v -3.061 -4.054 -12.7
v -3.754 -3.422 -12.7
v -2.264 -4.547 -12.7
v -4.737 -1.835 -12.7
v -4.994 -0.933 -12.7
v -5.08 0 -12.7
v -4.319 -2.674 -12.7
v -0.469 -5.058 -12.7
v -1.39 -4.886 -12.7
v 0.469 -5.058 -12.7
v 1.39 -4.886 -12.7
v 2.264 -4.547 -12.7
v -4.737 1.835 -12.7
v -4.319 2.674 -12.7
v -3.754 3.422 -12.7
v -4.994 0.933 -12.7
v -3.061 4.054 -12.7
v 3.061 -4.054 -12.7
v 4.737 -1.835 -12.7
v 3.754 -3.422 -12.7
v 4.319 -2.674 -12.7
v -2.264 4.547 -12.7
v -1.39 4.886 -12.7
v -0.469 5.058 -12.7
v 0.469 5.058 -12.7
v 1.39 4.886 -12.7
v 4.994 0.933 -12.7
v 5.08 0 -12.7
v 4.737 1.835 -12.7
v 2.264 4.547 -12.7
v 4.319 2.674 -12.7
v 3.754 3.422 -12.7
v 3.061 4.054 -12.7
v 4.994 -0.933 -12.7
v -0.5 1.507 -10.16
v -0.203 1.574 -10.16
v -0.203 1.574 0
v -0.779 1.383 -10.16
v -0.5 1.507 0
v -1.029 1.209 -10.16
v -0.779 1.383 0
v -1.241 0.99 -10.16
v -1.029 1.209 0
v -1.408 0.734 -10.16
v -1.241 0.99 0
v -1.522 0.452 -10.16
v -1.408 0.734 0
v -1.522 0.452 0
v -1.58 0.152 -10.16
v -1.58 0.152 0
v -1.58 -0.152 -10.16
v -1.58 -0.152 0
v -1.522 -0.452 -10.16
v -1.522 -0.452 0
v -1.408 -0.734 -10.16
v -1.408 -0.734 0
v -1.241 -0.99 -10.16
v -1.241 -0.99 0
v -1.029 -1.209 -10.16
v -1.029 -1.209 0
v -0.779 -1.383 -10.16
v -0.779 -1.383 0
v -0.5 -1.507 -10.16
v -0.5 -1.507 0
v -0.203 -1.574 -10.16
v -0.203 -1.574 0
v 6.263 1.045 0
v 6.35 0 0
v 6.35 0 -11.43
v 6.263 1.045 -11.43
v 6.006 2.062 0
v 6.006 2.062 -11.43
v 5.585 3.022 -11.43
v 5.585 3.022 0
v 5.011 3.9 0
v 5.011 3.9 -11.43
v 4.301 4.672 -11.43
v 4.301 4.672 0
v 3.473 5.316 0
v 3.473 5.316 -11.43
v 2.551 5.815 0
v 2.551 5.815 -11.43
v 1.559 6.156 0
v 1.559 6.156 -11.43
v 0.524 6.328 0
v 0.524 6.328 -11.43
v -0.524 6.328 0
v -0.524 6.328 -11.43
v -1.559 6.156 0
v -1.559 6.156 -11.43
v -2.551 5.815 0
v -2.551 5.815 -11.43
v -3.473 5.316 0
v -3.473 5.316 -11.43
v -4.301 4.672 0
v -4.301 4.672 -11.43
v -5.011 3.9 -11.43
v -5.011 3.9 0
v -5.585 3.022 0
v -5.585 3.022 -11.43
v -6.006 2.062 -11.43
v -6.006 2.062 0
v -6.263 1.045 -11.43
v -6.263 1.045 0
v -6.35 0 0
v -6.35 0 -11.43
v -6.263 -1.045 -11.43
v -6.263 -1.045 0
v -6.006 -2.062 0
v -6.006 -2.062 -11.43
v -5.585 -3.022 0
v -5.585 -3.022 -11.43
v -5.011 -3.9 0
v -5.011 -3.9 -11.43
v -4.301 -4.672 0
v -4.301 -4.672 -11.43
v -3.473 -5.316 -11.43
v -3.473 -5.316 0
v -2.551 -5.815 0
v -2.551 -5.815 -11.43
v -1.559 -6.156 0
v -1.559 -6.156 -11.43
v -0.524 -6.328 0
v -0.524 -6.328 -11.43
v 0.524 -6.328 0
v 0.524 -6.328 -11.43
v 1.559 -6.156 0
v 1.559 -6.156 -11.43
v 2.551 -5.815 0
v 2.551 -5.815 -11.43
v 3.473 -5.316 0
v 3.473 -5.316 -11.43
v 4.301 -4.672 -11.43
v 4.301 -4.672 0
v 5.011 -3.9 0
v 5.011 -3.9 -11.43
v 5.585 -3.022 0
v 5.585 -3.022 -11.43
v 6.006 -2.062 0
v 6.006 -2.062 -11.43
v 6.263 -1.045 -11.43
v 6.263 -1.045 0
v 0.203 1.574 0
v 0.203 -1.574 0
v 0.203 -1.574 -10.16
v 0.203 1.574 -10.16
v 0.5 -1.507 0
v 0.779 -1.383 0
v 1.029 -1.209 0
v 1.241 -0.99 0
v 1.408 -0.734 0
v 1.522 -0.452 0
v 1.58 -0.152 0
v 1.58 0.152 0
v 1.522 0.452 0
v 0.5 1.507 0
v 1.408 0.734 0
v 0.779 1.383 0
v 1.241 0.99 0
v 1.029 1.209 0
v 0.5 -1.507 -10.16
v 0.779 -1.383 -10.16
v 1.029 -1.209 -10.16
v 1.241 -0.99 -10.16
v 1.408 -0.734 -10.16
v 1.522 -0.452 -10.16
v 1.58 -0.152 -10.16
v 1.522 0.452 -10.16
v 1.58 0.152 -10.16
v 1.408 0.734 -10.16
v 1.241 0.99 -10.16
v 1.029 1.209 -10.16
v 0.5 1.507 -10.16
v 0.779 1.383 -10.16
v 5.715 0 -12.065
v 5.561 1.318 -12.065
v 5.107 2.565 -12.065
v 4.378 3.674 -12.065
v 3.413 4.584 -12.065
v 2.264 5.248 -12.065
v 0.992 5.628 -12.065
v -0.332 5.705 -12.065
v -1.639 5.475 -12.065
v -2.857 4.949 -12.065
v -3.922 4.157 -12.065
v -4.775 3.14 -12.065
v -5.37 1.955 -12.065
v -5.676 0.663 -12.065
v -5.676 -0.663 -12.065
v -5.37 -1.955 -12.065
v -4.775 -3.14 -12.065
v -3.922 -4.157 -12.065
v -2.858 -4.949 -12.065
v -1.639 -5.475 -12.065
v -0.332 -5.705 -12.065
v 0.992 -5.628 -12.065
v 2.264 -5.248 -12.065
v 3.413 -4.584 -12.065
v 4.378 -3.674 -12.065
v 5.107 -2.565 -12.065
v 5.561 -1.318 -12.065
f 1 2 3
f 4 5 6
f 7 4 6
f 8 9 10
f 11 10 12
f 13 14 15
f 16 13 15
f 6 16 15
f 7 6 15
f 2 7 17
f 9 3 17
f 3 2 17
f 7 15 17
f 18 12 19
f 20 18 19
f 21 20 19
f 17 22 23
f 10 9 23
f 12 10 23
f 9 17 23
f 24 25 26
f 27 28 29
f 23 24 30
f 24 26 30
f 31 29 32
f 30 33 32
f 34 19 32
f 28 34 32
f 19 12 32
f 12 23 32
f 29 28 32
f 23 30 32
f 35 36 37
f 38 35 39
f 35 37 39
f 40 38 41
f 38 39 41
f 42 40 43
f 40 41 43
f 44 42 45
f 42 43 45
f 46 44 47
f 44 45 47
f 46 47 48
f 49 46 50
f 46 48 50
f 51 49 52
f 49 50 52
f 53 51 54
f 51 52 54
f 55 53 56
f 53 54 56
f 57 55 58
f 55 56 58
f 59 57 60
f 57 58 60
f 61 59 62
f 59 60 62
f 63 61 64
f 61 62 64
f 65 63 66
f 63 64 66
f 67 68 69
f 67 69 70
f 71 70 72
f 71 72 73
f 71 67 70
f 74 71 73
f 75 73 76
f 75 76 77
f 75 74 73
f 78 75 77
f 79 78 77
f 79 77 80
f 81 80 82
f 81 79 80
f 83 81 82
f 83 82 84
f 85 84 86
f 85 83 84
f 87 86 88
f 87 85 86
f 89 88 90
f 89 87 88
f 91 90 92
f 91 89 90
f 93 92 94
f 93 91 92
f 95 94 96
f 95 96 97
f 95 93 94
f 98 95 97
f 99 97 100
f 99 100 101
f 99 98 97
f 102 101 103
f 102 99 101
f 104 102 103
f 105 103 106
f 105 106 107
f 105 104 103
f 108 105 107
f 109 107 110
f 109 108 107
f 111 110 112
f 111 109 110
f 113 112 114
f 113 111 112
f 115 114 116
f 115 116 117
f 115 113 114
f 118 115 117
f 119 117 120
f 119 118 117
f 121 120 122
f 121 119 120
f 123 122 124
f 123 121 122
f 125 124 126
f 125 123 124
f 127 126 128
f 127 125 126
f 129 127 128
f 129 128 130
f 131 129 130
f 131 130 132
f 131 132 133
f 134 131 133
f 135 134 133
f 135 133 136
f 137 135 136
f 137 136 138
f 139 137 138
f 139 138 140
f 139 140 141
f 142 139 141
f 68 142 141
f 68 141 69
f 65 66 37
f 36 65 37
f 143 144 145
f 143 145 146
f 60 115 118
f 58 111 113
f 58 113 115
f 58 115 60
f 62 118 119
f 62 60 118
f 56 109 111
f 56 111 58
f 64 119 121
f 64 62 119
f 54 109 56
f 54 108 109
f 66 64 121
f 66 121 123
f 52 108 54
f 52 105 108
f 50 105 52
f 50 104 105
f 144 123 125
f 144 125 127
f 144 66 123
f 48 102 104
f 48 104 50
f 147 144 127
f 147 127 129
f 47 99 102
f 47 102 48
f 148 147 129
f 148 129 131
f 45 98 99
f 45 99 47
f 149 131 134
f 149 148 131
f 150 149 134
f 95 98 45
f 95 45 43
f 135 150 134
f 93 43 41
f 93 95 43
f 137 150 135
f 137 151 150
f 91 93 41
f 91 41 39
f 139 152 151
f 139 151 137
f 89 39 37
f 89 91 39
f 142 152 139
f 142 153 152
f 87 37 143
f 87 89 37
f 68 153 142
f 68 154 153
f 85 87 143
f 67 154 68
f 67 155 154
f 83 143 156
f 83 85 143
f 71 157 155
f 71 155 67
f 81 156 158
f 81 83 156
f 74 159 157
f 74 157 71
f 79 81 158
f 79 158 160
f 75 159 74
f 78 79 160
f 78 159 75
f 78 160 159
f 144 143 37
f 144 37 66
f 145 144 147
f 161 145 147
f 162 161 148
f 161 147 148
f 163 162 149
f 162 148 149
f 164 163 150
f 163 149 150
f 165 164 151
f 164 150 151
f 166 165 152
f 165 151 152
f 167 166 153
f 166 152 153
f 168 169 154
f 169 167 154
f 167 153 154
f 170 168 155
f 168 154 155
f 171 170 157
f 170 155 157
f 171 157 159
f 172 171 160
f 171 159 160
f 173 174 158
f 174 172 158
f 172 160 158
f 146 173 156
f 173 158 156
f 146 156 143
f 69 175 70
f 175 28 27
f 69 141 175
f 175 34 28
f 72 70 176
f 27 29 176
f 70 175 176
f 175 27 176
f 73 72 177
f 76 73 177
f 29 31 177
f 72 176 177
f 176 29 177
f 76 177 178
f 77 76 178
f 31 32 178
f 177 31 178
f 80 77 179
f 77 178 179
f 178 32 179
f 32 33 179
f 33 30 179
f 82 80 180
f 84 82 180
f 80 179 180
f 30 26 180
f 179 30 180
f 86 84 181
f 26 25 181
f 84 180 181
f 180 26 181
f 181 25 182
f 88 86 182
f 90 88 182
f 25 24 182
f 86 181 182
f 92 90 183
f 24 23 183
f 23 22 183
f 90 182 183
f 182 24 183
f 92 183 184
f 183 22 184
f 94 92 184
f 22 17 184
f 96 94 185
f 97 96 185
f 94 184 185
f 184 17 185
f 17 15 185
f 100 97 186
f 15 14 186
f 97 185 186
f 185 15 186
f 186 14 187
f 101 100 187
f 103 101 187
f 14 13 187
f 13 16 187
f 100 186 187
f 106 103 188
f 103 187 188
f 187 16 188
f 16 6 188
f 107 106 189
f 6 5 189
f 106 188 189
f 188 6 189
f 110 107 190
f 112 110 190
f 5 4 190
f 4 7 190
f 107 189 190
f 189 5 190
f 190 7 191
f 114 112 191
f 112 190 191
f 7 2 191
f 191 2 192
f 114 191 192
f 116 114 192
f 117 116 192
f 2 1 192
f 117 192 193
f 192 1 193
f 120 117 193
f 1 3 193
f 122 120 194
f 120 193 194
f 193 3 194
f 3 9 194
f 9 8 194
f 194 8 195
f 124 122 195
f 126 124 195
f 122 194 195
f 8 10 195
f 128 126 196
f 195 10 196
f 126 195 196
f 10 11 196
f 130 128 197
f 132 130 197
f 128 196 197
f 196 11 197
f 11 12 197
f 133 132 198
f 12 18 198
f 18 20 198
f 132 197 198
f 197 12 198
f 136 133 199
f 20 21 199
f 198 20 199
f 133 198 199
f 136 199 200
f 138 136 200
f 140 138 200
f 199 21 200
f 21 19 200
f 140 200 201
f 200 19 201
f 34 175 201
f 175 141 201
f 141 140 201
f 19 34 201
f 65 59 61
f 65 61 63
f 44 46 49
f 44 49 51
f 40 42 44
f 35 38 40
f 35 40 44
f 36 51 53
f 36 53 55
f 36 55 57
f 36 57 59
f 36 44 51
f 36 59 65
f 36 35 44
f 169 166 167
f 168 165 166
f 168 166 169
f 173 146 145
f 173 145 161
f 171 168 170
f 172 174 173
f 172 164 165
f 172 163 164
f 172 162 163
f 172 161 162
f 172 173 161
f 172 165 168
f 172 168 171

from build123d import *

# Parameters (mm, degrees)
F0_R     = 6.35
F1_DEPTH = 12.7
F2_R     = 1.5875
F3_DEPTH = 10.16
F4_W     = 0.4064
F4_H     = 3.728392
F5_DEPTH = 11.4554
F6_SIZE  = 1.27


with BuildPart() as f1:
    # F0 (on Top) → F1 (new body)
    with BuildSketch(Plane.XY):
        Circle(F0_R)
    extrude(amount=-F1_DEPTH)

    # F2 (on face) → F3 (cut)
    with BuildSketch(Plane.XY):
        Circle(F2_R)
    extrude(amount=-F3_DEPTH, mode=Mode.SUBTRACT)

    # F4 (on Top) → F5 (join)
    with BuildSketch(Plane.XY):
        Rectangle(F4_W, F4_H)
    extrude(amount=-F5_DEPTH)

    # F6
    f6_edges = [f1.edges().sort_by_distance(p)[0] for p in [
        (-6.35, 0, -12.7),
    ]]
    chamfer(f6_edges, length=F6_SIZE)


solid = f1.part
